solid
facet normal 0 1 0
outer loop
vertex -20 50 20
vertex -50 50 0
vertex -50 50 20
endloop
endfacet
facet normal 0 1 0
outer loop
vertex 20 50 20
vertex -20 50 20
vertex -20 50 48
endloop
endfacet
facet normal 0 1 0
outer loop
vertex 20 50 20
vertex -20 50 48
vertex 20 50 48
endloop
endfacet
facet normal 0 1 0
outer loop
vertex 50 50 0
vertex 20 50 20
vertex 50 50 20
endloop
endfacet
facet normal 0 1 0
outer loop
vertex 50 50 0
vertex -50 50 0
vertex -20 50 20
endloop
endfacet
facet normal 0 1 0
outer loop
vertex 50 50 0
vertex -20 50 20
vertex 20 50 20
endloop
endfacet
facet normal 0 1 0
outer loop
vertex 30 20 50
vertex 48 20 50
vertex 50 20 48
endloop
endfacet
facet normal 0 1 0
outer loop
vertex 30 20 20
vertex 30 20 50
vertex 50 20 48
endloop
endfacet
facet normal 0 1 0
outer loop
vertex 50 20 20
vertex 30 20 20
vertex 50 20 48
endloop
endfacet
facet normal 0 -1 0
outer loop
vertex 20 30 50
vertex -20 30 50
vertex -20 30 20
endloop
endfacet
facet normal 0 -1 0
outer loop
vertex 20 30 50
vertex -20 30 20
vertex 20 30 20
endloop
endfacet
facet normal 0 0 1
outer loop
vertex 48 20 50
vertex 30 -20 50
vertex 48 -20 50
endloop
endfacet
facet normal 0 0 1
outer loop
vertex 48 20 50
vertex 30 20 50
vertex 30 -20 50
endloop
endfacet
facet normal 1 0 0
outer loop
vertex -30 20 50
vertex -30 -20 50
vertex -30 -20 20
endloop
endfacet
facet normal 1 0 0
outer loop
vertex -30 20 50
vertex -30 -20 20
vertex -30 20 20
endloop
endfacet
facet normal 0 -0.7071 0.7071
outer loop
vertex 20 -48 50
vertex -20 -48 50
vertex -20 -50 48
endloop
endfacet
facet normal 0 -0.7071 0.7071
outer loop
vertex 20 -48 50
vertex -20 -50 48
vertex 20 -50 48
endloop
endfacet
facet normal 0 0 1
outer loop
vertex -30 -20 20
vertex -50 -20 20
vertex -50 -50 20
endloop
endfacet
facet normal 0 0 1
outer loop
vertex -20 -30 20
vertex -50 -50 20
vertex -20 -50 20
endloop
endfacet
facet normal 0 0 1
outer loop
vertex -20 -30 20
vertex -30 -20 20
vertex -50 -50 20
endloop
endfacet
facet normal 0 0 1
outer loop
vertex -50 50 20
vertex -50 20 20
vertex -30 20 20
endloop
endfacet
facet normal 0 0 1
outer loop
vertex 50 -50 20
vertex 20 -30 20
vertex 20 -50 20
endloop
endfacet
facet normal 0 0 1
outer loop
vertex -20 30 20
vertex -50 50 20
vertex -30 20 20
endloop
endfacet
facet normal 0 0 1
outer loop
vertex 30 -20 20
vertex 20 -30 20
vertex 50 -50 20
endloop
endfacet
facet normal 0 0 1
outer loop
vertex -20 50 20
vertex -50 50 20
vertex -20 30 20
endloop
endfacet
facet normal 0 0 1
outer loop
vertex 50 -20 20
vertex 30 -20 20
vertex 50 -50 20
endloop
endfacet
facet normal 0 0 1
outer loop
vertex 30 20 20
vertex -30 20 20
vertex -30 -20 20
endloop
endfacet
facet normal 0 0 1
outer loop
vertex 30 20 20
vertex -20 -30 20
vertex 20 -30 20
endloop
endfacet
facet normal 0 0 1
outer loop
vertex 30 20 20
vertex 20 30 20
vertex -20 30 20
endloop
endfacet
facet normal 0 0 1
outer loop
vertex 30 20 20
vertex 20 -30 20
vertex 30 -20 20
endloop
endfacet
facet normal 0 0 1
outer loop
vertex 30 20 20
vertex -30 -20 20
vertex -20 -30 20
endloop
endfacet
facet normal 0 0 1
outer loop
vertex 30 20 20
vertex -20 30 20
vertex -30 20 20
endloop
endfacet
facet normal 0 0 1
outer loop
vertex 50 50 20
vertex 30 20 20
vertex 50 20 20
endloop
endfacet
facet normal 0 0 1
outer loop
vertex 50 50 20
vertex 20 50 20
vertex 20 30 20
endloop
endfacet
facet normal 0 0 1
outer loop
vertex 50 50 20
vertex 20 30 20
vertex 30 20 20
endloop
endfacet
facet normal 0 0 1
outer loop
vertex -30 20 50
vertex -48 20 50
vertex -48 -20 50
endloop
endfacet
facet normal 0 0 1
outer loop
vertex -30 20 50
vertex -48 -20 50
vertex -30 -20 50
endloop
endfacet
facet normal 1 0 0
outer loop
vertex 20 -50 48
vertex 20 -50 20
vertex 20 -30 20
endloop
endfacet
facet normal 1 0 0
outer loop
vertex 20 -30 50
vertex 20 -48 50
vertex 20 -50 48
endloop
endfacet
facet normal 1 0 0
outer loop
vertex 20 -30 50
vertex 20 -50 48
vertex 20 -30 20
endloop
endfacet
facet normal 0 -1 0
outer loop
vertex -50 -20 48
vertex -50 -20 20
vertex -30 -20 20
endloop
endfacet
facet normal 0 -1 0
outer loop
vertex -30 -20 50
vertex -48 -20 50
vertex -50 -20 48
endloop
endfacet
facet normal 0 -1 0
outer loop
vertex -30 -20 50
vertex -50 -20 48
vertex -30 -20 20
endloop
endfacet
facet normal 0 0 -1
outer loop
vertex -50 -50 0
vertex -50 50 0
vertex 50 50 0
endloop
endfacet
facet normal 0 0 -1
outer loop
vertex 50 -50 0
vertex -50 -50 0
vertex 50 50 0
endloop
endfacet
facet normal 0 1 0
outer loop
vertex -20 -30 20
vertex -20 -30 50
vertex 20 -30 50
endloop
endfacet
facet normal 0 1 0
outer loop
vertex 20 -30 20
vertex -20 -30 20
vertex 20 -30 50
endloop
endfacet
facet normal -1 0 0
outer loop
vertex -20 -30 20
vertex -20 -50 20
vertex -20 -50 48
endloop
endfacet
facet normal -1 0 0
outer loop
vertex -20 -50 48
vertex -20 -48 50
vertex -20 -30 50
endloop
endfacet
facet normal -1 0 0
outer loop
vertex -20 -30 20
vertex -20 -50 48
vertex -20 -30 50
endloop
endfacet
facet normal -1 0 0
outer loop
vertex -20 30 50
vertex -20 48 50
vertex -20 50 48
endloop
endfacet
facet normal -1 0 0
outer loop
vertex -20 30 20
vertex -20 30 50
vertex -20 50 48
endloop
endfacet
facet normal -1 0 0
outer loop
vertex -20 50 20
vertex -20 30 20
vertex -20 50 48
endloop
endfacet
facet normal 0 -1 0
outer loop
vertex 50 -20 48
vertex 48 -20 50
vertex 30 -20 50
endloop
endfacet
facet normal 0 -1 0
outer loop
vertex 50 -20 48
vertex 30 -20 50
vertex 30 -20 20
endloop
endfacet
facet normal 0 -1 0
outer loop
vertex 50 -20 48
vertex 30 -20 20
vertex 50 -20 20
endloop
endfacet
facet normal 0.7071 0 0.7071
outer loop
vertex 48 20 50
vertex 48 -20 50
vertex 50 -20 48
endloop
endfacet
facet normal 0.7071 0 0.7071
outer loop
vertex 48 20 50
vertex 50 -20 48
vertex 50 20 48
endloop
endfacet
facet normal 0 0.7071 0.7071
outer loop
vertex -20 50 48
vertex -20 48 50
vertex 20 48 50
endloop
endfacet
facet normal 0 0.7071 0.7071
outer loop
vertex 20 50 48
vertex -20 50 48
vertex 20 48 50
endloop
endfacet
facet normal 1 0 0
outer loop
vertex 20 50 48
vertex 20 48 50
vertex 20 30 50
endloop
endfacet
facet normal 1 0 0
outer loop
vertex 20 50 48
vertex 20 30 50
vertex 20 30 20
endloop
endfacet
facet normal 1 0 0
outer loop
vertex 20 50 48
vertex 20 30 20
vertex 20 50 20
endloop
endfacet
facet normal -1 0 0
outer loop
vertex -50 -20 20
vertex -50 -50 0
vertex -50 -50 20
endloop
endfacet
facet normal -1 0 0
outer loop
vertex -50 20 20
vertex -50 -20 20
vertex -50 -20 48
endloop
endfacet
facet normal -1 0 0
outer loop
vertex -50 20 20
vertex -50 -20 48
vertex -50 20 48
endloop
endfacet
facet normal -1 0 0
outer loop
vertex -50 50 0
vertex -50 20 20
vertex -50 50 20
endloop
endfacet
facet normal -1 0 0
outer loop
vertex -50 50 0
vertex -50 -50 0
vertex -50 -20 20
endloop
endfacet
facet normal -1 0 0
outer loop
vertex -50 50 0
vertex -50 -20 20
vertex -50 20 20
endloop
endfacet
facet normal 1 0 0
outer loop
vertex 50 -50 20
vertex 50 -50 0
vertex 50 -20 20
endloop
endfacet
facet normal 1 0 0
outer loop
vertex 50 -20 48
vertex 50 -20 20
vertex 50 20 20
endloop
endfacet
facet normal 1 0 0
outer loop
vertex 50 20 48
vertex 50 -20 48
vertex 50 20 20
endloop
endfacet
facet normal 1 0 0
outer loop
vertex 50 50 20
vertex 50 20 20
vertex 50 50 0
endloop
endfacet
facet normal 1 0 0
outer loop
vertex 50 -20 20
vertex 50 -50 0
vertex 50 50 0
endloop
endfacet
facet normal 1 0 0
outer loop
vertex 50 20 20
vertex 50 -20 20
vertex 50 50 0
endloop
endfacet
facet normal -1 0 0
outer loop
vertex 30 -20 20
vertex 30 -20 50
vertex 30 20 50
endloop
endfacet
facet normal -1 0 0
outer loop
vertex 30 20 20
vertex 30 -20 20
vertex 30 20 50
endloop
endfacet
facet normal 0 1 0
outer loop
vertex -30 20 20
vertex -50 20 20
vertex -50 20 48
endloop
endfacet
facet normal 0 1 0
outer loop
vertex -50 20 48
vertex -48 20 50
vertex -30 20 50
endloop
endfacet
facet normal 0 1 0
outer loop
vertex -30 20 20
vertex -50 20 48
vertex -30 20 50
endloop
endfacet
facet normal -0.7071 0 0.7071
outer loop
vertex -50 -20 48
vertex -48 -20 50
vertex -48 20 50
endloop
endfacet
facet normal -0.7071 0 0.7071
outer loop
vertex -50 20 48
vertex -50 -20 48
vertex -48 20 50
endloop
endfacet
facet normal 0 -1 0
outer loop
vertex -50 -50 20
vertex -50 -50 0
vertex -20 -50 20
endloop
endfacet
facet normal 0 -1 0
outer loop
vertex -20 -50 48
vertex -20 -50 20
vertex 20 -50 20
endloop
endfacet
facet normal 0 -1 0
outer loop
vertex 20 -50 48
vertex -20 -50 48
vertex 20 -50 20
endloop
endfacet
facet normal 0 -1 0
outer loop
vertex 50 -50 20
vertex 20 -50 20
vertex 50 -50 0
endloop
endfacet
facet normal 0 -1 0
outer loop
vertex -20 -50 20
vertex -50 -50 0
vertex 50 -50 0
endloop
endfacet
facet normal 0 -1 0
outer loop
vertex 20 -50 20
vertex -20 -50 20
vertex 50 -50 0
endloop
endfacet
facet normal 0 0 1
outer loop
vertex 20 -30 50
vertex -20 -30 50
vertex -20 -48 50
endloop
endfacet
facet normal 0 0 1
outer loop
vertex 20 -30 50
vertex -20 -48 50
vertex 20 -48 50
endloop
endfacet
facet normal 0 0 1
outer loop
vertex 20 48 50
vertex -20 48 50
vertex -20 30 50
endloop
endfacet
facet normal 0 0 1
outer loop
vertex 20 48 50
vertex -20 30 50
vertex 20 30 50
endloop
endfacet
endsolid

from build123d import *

# Parameters (mm, degrees)
F0_W     = 100
F0_H     = 100
F1_DEPTH = 50
F2_W     = 60
F2_H     = 60
F3_DEPTH = 30
F4_W     = 30
F4_H     = 30
F5_DEPTH = 30
F6_SIZE  = 2


with BuildPart() as f1:
    # F0 (on Top) → F1 (new body)
    with BuildSketch(Plane.XY):
        Rectangle(F0_W, F0_H)
    extrude(amount=F1_DEPTH)

    # F2 (on face) → F3 (cut)
    with BuildSketch(Plane.XY.offset(50)):
        Rectangle(F2_W, F2_H)
    extrude(amount=-F3_DEPTH, mode=Mode.SUBTRACT)

    # F4 (on face) → F5 (cut)
    with BuildSketch(Plane.XY.offset(50)):
        with Locations((-35, 35)):
            Rectangle(F4_W, F4_H)
        with Locations((-35, -35)):
            Rectangle(F4_W, F4_H)
        with Locations((35, -35)):
            Rectangle(F4_W, F4_H)
        with Locations((35, 35)):
            Rectangle(F4_W, F4_H)
    extrude(amount=-F5_DEPTH, mode=Mode.SUBTRACT)

    # F6
    f6_edges = [f1.edges().sort_by_distance(p)[0] for p in [
        (0, -50, 50),
        (50, 0, 50),
        (0, 50, 50),
        (-50, 0, 50),
    ]]
    chamfer(f6_edges, length=F6_SIZE)


solid = f1.part
